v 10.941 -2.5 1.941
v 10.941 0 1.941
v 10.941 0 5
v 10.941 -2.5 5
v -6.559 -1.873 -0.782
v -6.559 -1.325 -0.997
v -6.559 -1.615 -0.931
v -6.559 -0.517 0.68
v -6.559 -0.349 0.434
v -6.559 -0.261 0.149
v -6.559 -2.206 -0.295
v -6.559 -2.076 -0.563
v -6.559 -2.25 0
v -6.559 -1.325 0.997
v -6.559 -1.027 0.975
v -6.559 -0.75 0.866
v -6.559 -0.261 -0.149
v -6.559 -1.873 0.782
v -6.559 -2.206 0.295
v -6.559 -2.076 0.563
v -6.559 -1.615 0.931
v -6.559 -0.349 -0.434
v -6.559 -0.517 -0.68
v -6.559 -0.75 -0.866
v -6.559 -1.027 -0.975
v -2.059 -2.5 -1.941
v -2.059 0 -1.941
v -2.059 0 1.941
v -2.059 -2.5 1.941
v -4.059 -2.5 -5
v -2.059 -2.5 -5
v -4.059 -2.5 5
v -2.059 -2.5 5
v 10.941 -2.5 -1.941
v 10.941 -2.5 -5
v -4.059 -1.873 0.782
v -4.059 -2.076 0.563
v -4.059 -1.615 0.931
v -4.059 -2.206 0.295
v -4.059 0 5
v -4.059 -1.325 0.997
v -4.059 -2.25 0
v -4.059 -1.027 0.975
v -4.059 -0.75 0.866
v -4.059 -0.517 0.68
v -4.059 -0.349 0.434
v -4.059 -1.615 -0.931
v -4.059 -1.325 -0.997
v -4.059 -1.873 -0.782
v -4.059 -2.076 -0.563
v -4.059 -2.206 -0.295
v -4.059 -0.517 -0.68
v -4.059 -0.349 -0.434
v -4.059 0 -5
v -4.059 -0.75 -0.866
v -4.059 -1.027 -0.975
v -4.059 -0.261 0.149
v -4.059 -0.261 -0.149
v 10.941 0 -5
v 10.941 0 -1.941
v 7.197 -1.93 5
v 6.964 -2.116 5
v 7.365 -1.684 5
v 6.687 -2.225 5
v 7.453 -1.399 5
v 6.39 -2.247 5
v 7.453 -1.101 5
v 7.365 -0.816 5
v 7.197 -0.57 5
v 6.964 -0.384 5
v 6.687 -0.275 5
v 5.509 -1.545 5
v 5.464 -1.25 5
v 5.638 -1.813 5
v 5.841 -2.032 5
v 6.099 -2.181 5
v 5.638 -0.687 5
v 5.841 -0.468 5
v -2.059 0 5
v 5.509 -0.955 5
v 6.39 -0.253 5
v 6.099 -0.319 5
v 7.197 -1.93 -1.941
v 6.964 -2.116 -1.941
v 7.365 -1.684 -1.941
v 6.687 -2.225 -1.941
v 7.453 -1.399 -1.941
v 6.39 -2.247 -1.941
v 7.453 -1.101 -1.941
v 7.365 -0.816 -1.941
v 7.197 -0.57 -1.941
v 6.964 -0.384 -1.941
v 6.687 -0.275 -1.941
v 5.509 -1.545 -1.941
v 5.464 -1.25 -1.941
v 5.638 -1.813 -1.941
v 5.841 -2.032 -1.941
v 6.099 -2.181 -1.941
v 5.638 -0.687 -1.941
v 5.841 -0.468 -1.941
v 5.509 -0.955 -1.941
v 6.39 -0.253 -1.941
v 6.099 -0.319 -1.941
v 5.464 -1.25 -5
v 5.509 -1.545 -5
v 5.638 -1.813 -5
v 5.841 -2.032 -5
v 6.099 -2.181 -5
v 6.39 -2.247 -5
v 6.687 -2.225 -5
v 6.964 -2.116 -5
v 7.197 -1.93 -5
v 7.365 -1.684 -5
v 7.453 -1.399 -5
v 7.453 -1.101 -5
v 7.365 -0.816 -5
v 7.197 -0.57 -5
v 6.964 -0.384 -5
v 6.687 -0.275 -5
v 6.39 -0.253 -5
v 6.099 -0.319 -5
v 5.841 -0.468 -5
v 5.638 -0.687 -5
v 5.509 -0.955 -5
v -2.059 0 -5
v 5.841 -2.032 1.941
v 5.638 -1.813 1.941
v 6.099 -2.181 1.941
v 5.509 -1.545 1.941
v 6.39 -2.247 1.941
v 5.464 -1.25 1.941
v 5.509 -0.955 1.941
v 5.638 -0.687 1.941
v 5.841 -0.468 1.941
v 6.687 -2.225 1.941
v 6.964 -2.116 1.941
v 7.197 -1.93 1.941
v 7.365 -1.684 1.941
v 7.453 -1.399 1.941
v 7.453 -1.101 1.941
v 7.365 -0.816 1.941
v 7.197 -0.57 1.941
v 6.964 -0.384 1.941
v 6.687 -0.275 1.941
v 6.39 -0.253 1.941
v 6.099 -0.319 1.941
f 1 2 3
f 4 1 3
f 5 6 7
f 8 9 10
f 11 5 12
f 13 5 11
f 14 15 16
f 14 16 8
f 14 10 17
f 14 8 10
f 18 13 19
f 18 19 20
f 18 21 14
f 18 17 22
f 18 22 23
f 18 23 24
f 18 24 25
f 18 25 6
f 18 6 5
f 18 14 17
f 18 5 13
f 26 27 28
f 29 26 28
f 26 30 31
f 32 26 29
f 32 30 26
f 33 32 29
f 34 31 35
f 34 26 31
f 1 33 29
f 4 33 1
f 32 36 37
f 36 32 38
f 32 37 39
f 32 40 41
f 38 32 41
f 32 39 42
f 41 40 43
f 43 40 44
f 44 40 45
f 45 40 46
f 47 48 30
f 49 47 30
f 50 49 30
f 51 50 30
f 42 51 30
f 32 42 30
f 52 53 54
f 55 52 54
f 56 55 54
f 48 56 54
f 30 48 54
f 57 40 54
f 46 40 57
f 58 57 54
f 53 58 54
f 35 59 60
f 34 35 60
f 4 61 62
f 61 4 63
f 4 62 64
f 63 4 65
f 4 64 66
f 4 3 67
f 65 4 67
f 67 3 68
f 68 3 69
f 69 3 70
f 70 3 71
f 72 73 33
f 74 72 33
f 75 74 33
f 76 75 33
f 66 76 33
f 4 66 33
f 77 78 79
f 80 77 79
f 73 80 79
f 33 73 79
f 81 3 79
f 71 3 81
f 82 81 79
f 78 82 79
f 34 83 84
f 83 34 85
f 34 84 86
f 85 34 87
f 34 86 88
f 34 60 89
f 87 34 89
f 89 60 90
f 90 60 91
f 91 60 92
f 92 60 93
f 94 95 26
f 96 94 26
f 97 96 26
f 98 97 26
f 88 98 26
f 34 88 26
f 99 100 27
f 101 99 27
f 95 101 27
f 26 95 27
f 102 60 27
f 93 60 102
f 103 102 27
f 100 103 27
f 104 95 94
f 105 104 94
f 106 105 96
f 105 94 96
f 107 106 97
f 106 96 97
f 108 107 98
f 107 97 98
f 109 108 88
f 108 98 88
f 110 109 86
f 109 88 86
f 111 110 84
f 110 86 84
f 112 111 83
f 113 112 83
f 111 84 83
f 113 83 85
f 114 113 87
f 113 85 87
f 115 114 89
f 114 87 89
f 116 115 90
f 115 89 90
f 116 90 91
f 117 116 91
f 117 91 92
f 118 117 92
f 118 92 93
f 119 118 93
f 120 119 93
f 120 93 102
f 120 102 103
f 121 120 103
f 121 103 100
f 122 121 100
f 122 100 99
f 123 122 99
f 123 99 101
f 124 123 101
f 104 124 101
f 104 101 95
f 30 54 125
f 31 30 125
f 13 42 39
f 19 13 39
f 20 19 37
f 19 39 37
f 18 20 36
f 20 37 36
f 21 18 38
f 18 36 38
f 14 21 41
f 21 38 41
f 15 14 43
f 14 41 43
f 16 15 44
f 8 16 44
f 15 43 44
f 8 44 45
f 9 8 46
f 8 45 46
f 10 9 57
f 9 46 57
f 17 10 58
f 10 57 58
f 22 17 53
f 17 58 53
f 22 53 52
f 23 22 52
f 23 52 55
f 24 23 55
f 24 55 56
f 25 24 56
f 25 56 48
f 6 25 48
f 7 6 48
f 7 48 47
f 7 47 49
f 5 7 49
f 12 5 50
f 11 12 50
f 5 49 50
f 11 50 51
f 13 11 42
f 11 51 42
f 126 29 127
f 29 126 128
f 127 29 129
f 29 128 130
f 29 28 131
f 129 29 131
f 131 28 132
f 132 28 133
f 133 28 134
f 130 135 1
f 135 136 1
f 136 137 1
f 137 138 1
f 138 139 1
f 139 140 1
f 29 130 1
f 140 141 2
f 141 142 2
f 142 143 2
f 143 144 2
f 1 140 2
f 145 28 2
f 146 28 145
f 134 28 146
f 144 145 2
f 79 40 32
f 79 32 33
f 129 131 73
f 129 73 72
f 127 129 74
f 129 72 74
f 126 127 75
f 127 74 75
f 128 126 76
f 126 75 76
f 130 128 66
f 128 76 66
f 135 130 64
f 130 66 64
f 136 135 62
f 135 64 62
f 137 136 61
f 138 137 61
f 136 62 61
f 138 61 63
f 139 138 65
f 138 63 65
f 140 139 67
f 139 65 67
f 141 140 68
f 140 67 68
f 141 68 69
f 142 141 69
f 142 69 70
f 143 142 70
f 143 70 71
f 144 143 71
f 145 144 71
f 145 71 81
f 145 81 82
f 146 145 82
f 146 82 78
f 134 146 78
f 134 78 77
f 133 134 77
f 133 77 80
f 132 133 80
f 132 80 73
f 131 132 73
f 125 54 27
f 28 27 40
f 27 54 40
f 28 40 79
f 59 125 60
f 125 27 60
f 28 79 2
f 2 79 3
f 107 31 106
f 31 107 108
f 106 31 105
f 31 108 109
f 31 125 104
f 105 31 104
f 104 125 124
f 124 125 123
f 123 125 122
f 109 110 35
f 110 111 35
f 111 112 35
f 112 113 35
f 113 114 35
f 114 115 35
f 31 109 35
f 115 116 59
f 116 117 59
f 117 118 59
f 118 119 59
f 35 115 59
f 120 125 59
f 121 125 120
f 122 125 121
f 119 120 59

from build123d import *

# Parameters (mm, degrees)
F2_W     = 2
F2_H     = 3.0588235933
F2_H_2   = 3.8823528133
F3_DEPTH = 2.5
F5_D     = 2
F6_R     = 1
F7_DEPTH = 2.5


with BuildPart() as f3:
    # F2 (on Front) → F3 (new body)
    with BuildSketch(Plane.XZ):
        with Locations((-3.058823533, 3.4705882033)):
            Rectangle(F2_W, F2_H)
        Polygon((-0.058823533, 5), (-2.058823533, 5), (-2.058823533, 1.9411764067), (10.941176467, 1.9411764067), (10.941176467, 5), align=None)
        with Locations((-3.058823533, 0)):
            Rectangle(F2_W, F2_H_2)
        with Locations((-3.058823533, -3.4705882033)):
            Rectangle(F2_W, F2_H)
        Polygon((10.941176467, -1.9411764067), (-2.058823533, -1.9411764067), (-2.058823533, -5), (-0.058823533, -5), (10.941176467, -5), align=None)
    extrude(amount=F3_DEPTH)

    # F5 (through all)
    with Locations(Plane(origin=(0, 0, -5), x_dir=(1, 0, 0), z_dir=(0, 0, -1))):
        with Locations((6.4643374644, 1.25)):
            Hole(F5_D / 2)

    # F6 (on face) → F7 (join)
    with BuildSketch(Plane(origin=(-4.058823533, 0, 0), x_dir=(0, -1, 0), z_dir=(-1, 0, 0))):
        with Locations((1.25, 0)):
            Circle(F6_R)
    extrude(amount=F7_DEPTH)


solid = f3.part
